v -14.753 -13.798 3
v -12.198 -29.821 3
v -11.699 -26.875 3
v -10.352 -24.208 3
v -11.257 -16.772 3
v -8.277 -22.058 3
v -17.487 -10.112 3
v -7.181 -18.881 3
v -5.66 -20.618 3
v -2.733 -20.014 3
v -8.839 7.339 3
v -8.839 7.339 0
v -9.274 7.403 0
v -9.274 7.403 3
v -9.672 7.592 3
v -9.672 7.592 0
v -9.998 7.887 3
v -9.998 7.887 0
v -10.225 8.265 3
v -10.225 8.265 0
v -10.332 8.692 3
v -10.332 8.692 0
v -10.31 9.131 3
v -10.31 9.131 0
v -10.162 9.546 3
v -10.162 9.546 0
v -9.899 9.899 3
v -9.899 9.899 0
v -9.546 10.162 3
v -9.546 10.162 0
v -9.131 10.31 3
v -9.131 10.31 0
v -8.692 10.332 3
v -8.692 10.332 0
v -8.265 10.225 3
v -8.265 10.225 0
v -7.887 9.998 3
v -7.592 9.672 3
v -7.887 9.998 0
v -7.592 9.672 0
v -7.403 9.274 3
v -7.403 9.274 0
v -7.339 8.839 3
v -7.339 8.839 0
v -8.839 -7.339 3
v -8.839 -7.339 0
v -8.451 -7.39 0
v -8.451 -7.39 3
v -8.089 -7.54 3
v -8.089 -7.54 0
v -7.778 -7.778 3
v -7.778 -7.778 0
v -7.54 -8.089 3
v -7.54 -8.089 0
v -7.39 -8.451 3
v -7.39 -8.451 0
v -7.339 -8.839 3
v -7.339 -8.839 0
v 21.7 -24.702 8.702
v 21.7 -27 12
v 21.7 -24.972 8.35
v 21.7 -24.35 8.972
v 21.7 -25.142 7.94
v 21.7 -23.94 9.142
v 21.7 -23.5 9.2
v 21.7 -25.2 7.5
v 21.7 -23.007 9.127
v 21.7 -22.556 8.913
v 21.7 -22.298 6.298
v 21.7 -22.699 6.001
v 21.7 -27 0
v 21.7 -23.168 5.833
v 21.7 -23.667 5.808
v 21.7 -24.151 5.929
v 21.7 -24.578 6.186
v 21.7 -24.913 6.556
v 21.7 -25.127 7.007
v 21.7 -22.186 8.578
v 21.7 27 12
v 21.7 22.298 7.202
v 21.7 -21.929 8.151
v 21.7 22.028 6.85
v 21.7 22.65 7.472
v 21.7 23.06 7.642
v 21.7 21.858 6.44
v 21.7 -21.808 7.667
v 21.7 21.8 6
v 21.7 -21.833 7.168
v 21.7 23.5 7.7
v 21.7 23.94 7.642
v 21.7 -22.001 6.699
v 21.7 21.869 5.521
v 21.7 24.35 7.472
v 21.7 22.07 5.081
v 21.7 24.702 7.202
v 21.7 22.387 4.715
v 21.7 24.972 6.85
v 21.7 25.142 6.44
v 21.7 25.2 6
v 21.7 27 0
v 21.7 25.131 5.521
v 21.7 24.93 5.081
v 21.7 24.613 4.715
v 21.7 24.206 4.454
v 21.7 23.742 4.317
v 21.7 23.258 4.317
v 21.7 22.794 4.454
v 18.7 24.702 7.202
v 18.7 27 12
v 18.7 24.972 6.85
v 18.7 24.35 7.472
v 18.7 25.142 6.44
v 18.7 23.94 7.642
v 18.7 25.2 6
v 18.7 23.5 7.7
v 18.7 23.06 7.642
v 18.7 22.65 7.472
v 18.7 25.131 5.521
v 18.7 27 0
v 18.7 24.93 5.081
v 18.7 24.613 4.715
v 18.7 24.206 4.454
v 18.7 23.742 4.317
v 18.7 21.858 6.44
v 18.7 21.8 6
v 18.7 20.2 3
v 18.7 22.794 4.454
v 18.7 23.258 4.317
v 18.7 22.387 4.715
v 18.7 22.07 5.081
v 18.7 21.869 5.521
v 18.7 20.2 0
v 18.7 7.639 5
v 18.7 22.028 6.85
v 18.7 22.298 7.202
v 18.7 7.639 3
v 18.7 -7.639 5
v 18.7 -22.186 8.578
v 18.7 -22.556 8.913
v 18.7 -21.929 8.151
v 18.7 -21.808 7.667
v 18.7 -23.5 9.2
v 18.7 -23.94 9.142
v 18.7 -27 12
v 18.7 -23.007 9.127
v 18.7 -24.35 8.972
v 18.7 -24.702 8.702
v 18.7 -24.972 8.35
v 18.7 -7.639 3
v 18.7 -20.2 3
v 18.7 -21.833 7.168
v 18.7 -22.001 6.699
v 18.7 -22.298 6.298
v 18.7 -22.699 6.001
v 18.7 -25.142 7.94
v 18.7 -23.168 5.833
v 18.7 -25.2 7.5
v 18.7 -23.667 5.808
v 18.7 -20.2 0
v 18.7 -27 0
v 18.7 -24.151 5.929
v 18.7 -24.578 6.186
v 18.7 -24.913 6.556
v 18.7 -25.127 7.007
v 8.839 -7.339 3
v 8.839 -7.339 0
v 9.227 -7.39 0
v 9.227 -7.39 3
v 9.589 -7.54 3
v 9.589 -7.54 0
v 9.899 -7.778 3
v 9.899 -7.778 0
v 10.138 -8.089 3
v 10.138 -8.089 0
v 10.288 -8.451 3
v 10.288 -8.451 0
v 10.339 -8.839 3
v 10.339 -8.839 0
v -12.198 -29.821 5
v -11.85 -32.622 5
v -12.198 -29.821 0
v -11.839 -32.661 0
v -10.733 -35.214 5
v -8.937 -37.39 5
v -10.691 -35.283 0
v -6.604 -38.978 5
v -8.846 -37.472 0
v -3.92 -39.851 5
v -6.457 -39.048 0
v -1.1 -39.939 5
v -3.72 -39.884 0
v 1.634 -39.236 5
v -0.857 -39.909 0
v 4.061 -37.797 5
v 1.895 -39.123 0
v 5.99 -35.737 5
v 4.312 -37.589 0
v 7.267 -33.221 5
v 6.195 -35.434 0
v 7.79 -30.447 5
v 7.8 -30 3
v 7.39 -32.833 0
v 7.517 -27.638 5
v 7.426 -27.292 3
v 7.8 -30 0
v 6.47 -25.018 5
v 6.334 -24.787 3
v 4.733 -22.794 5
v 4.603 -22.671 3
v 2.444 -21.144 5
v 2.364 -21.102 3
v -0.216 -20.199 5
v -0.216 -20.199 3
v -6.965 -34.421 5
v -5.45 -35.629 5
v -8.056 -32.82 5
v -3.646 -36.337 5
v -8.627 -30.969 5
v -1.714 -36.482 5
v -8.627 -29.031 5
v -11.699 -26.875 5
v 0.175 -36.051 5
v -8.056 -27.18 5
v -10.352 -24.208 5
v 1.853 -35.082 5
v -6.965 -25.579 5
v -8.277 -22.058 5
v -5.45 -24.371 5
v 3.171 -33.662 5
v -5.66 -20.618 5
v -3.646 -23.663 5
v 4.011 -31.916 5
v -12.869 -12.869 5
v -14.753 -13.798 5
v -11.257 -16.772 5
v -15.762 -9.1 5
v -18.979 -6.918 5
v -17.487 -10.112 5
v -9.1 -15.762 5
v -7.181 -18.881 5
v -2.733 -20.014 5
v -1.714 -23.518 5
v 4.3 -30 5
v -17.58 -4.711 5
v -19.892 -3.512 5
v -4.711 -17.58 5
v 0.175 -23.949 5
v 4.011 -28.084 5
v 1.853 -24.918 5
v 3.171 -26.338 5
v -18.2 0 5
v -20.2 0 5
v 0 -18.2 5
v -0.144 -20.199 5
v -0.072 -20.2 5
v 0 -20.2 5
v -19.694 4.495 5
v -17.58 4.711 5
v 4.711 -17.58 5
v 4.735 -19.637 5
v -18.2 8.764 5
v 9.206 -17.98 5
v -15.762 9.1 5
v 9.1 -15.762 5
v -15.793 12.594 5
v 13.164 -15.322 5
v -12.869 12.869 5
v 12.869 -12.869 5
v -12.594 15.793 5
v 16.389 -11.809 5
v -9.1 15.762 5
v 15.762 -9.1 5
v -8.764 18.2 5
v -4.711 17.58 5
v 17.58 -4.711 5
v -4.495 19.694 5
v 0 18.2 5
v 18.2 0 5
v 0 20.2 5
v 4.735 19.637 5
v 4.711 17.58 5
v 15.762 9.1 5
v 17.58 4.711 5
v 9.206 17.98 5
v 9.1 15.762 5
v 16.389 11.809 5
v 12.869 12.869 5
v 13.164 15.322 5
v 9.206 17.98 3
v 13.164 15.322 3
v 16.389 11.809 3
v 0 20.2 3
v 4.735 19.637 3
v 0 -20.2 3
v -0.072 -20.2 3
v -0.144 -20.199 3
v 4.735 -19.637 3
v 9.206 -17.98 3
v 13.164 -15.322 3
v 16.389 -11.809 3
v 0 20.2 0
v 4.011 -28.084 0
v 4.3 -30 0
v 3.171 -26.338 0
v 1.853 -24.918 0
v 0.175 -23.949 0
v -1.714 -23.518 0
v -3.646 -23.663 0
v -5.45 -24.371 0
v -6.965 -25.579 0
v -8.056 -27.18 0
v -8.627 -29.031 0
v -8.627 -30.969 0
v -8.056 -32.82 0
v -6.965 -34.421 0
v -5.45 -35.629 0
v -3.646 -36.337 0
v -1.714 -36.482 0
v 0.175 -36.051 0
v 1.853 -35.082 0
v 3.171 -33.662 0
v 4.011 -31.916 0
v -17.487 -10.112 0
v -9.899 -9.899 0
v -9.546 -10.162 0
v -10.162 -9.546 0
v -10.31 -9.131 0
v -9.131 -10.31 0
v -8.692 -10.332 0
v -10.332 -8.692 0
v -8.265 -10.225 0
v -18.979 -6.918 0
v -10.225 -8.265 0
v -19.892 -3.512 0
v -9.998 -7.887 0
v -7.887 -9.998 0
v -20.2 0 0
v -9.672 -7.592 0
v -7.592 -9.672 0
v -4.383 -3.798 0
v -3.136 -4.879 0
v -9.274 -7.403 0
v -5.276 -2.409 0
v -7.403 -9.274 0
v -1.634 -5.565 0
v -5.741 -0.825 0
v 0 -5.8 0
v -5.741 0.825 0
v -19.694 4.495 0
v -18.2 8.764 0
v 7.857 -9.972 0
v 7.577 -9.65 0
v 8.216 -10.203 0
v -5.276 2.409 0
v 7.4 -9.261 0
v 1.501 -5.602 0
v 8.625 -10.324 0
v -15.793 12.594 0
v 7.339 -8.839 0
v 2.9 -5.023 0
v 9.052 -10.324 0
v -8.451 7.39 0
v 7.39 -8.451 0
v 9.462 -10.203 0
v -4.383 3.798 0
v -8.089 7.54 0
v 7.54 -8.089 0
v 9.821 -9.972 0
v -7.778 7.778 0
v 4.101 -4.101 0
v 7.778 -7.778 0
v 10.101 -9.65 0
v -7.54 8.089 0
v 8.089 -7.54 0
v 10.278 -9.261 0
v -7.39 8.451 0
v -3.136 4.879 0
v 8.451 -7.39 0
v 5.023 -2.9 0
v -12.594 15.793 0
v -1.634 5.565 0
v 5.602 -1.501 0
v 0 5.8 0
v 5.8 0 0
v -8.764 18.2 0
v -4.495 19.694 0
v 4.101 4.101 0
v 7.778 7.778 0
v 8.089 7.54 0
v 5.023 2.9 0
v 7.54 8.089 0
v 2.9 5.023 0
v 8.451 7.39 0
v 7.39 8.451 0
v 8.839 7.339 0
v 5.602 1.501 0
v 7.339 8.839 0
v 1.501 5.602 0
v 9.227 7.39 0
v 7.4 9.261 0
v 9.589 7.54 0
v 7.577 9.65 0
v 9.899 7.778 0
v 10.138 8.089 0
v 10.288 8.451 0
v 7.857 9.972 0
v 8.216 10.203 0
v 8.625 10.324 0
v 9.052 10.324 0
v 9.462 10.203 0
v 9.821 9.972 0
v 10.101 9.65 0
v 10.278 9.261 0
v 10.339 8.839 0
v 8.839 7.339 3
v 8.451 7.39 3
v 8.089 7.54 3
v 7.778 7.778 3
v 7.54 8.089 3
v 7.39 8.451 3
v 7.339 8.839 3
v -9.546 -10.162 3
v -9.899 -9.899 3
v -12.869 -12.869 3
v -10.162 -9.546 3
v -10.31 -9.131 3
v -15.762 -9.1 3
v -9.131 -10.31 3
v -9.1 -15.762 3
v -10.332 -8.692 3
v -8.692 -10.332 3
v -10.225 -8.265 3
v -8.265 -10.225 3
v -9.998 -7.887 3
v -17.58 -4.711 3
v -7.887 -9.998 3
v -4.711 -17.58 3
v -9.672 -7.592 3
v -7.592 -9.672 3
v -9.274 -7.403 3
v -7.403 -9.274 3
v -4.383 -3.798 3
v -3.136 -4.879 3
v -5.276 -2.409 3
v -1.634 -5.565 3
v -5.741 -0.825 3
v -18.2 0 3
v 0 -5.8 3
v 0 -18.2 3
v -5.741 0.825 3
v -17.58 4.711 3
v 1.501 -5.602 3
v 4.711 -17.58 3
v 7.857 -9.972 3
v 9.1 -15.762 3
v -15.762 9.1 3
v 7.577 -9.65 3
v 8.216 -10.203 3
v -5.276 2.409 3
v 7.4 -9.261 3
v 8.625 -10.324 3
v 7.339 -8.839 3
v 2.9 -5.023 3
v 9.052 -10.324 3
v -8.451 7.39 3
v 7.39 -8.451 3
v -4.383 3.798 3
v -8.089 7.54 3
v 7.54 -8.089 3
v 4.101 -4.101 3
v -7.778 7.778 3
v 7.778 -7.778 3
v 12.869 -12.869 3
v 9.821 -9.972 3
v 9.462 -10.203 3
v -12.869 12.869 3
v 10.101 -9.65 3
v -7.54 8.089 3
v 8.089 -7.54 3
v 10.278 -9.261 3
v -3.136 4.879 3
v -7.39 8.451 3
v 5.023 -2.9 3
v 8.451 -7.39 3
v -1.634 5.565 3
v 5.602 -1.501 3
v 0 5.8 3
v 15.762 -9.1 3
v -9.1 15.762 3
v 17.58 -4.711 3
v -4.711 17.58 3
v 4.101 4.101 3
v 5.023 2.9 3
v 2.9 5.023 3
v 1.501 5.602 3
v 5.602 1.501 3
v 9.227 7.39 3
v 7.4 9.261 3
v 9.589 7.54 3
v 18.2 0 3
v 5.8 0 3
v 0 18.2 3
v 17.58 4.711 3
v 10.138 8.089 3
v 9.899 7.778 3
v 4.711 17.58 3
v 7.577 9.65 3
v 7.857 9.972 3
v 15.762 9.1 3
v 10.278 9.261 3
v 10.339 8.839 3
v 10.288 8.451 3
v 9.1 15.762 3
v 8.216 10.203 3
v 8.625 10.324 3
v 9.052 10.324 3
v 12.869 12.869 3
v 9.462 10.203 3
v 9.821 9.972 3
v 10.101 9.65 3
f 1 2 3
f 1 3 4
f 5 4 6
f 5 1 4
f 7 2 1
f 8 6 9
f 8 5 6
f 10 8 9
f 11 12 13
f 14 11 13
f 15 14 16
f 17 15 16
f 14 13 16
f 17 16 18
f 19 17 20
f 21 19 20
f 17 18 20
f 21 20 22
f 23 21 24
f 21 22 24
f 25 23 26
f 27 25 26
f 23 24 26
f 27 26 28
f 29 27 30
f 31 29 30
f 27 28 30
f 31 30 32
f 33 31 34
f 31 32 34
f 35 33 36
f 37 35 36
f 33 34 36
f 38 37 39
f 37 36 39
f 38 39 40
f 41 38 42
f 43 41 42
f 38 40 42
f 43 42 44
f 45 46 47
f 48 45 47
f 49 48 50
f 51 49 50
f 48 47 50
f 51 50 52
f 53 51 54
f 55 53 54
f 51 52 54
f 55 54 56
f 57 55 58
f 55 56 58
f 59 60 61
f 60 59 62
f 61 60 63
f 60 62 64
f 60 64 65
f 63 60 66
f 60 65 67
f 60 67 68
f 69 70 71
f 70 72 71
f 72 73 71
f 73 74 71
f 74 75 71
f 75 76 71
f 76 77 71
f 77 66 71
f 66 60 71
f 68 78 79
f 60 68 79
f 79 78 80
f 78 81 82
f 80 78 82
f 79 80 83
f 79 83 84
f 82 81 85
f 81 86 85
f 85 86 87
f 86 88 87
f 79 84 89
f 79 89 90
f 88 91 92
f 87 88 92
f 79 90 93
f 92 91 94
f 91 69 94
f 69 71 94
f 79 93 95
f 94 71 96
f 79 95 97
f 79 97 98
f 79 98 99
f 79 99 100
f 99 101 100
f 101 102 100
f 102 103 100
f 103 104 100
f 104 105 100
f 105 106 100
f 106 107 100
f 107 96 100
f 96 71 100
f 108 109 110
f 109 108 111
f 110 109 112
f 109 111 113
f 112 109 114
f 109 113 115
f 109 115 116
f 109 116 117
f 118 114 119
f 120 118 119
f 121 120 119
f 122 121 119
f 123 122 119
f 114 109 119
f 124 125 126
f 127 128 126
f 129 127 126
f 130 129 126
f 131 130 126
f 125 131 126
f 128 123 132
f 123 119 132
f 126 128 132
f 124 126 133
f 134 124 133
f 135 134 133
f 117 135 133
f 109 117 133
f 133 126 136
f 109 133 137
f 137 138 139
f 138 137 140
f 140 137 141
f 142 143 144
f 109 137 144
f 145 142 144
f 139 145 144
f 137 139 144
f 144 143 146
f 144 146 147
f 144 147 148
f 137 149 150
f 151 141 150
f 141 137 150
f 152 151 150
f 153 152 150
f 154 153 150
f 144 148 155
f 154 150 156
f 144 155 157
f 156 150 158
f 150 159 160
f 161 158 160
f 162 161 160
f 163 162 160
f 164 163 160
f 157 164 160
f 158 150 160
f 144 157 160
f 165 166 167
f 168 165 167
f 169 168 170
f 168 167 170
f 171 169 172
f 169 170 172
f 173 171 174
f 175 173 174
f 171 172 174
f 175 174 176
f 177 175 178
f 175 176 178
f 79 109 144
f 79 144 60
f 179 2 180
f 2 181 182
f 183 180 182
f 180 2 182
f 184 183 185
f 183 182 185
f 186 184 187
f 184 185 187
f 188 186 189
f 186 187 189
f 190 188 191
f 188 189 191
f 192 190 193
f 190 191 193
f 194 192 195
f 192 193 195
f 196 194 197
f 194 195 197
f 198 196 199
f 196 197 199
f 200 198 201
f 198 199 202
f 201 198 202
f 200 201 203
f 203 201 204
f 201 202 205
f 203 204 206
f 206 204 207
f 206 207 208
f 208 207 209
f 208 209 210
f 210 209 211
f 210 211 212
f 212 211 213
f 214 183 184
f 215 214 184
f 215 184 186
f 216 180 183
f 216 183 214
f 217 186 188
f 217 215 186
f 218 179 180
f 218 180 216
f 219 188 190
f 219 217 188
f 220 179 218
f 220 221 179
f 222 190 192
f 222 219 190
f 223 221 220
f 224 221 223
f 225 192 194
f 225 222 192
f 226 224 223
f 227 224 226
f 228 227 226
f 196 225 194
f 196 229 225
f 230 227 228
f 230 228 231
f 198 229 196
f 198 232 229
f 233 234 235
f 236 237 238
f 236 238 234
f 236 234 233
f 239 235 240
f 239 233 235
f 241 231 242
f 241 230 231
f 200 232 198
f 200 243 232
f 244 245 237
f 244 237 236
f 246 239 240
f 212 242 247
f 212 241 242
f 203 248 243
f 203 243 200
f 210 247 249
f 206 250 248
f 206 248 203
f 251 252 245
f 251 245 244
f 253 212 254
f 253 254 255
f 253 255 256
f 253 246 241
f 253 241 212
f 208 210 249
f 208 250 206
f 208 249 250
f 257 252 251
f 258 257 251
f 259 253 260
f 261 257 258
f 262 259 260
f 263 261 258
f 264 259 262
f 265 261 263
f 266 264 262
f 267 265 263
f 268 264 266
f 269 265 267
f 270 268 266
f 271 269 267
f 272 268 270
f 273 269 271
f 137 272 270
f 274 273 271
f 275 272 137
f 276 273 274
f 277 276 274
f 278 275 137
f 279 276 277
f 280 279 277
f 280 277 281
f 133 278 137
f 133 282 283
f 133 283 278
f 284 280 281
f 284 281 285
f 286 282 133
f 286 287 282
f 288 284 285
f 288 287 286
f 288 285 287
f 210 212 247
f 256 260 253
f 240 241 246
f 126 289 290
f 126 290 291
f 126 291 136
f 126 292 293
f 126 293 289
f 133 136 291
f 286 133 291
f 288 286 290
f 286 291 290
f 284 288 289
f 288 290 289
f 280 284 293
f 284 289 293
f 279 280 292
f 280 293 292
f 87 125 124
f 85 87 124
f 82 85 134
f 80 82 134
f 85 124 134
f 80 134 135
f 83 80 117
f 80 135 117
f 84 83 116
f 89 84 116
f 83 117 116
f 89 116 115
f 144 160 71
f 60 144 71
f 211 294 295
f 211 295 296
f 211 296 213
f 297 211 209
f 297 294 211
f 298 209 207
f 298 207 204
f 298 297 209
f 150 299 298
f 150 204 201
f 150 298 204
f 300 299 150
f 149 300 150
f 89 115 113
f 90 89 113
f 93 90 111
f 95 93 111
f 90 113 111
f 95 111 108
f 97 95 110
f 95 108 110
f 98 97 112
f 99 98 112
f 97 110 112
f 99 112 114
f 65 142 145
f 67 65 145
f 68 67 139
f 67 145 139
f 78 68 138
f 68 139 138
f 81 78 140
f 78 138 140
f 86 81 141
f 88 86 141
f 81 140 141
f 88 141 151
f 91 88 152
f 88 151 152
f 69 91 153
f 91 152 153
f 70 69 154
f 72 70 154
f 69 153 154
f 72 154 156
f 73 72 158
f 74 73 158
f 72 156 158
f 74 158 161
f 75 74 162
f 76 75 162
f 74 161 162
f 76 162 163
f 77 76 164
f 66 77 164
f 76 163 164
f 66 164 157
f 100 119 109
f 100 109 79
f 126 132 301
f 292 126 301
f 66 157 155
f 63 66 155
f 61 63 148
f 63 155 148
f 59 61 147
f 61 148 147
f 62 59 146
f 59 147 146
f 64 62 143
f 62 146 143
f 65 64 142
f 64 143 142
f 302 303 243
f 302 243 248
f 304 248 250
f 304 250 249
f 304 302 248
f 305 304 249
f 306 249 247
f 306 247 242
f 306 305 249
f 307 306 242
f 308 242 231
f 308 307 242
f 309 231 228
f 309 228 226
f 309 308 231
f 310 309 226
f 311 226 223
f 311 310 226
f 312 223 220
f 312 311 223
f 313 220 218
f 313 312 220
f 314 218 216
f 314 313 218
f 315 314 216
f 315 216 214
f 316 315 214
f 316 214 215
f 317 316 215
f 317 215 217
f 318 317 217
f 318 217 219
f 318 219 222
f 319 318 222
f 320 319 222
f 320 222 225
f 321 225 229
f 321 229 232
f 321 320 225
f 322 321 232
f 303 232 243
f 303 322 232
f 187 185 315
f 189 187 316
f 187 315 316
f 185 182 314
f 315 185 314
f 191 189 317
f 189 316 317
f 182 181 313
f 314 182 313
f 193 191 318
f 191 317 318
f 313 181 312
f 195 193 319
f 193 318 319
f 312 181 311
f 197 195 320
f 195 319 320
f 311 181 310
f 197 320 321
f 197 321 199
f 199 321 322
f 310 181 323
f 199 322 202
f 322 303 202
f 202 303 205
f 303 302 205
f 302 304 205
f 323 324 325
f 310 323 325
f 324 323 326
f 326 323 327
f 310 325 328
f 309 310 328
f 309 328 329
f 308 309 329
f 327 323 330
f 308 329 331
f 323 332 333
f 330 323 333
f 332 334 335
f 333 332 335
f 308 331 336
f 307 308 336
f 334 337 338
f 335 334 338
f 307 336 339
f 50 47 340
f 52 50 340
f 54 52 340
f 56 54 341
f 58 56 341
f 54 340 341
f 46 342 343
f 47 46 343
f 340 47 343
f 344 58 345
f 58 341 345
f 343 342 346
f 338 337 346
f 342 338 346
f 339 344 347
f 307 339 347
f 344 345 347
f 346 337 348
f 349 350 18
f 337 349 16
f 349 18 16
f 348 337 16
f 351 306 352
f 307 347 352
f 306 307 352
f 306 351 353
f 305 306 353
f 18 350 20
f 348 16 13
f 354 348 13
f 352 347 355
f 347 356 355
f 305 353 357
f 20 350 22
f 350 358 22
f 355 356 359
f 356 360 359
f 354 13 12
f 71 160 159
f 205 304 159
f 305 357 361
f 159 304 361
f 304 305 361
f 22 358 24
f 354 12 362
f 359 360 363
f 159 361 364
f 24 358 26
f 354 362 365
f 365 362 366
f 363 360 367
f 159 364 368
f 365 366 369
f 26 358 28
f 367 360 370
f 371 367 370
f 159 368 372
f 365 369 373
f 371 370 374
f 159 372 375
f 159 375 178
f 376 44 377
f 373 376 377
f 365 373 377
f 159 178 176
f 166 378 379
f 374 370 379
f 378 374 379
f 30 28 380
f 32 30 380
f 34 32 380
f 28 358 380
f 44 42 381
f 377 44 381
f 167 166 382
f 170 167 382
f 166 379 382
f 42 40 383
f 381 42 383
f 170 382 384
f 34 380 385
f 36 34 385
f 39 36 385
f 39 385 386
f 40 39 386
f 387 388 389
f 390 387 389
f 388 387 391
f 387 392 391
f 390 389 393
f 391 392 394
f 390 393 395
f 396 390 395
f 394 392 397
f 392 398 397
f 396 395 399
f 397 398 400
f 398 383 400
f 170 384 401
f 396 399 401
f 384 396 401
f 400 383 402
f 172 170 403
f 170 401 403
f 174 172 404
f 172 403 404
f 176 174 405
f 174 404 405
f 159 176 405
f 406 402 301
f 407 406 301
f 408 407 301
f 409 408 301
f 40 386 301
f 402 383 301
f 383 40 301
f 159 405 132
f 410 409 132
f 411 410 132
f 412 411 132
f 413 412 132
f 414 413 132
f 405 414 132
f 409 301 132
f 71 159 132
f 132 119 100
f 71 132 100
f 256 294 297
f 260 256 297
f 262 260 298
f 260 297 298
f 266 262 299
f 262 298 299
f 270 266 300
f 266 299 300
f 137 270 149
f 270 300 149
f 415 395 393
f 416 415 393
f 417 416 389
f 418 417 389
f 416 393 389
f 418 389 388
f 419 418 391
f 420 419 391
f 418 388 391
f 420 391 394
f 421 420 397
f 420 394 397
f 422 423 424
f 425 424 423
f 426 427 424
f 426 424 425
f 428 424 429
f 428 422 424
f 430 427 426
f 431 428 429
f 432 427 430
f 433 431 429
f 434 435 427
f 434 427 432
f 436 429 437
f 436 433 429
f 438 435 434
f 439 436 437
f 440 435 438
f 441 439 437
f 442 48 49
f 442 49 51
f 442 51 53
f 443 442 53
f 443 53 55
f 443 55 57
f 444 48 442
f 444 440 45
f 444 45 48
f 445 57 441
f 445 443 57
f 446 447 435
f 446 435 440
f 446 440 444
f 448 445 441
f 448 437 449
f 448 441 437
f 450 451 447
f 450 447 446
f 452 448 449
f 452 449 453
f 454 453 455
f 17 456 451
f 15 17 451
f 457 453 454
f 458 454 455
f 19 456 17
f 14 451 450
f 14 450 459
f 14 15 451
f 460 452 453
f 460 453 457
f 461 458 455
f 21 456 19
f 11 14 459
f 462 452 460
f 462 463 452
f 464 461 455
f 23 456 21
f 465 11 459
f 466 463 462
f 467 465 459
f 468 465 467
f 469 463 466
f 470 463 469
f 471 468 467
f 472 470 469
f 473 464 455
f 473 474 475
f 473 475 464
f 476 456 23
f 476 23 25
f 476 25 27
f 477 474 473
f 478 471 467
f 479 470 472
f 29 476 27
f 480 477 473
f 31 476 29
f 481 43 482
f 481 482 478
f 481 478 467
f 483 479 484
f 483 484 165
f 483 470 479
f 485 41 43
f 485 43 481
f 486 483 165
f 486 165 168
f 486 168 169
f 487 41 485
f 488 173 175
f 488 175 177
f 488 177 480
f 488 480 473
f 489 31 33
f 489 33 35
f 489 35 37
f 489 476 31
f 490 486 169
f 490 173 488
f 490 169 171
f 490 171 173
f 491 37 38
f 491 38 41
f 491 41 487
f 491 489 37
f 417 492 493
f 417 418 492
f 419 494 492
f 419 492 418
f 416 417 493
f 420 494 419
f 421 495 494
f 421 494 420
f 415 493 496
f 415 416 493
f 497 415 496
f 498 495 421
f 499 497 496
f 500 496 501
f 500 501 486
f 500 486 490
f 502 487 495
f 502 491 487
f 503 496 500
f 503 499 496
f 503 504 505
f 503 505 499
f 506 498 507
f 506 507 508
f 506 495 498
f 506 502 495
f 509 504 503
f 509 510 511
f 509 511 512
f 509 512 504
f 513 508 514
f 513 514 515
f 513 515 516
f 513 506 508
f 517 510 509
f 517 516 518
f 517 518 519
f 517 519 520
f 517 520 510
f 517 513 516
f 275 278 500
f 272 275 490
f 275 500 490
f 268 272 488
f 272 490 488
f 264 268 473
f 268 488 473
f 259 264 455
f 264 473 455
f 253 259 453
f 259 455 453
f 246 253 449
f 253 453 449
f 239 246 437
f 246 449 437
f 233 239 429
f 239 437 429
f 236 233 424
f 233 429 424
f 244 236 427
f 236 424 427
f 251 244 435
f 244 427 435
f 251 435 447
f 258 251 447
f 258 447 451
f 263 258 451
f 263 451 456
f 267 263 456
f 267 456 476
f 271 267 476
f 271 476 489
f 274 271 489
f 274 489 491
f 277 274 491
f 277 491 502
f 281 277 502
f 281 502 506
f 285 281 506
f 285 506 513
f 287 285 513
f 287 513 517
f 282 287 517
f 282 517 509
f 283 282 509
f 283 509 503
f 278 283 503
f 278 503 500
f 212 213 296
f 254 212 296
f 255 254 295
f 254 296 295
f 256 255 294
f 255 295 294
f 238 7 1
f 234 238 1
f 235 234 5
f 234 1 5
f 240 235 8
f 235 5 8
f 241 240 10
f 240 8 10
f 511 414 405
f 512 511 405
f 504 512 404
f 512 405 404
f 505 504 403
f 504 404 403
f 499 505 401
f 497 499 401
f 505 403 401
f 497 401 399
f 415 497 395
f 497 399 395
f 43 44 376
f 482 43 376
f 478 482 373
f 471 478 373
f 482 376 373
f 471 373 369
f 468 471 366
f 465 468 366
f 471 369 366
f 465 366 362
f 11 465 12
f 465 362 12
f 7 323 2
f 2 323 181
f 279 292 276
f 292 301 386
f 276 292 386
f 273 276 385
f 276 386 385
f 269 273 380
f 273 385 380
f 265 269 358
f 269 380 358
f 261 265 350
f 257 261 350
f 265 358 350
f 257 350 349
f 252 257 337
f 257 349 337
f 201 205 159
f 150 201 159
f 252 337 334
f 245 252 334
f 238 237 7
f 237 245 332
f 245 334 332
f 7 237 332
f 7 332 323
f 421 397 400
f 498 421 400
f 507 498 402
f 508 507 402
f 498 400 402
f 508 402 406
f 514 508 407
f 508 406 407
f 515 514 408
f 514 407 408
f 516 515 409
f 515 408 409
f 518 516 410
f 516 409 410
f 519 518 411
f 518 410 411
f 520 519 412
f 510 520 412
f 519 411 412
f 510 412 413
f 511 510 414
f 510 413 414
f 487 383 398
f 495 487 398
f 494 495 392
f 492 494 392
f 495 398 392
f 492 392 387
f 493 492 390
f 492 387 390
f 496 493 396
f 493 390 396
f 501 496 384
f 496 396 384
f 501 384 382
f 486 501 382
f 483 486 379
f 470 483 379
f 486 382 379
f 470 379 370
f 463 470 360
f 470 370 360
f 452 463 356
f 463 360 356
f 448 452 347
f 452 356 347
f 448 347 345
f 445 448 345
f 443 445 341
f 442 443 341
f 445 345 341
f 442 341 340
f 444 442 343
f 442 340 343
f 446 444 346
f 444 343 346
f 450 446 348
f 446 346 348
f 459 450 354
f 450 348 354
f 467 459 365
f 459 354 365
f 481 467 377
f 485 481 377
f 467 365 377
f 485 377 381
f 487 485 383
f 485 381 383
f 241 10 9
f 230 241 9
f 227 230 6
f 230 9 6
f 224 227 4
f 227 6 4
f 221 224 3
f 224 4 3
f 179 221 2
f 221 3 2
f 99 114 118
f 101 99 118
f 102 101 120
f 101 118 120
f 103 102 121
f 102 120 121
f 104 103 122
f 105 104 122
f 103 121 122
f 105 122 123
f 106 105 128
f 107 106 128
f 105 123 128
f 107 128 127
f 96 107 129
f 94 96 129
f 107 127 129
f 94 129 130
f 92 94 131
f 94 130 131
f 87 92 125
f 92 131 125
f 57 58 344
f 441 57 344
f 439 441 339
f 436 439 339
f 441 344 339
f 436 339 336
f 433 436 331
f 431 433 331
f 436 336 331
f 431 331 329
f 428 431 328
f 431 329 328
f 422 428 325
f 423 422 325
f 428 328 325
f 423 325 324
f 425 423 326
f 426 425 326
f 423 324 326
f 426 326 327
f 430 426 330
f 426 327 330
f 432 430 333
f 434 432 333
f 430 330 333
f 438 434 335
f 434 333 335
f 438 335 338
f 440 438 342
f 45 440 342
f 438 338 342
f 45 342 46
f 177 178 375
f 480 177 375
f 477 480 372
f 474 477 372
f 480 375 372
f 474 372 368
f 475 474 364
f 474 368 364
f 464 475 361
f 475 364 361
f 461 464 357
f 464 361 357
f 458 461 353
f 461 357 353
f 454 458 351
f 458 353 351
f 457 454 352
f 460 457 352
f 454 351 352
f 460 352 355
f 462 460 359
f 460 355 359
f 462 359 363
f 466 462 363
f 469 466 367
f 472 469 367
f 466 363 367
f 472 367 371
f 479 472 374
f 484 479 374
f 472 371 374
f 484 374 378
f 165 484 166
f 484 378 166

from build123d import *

# Parameters (mm, degrees)
F0_W     = 3
F0_H     = 6.8
F1_DEPTH = 12
F2_DEPTH = 5
F3_DEPTH = 3
F0_R     = 6.5
F4_DEPTH = 5
F5_DEPTH = 3
F7_DEPTH = 25
F8_DEPTH = 25
F9_DEPTH = 3


with BuildPart() as f1:
    # F0 (on Top) → F1 (new body)
    with BuildSketch(Plane.XY):
        with Locations((20.2, 23.6)):
            Rectangle(F0_W, F0_H)
        with BuildLine():
            Line((18.7, 20.2), (18.7, 7.6387171698))
            ThreePointArc((18.7, 7.6387171698), (19.8214530244, 3.8923000912), (20.2, 0))
            Line((20.2, 0), (21.7, 0))
            Line((21.7, 0), (21.7, 20.2))
            Line((21.7, 20.2), (18.7, 20.2))
        make_face()
        with BuildLine():
            Line((21.7, 0), (20.2, 0))
            ThreePointArc((20.2, 0), (19.8214530244, -3.8923000912), (18.7, -7.6387171698))
            Line((18.7, -7.6387171698), (18.7, -20.2))
            Line((18.7, -20.2), (21.7, -20.2))
            Line((21.7, -20.2), (21.7, 0))
        make_face()
        with Locations((20.2, -23.6)):
            Rectangle(F0_W, F0_H)
        with BuildLine():
            ThreePointArc((20.2, 0), (19.8214530244, 3.8923000912), (18.7, 7.6387171698))
            Line((18.7, 7.6387171698), (18.7, 0))
            Line((18.7, 0), (20.2, 0))
        make_face()
        with BuildLine():
            ThreePointArc((18.7, -7.6387171698), (19.8214530244, -3.8923000912), (20.2, 0))
            Line((20.2, 0), (18.7, 0))
            Line((18.7, 0), (18.7, -7.6387171698))
        make_face()
    extrude(amount=F1_DEPTH)

    # F0 (on Top) → F2 (join)
    with BuildSketch(Plane.XY):
        with BuildLine():
            Line((0, 18.2), (0, 20.2))
            ThreePointArc((0, 20.2), (-14.28355698, 14.28355698), (-20.2, 0))
            Line((-20.2, 0), (-17.4867563263, -10.1120400111))
            ThreePointArc((-17.4867563263, -10.1120400111), (-11.2572434768, -16.7724318244), (-2.7332534209, -20.0142280825))
            ThreePointArc((-2.7332534209, -20.0142280825), (-1.4686306009, -20.0267809208), (-0.215705511, -20.1988482625))
            ThreePointArc((-0.215705511, -20.1988482625), (-0.1078542929, -20.1997120636), (0, -20.2))
            Line((0, -20.2), (0, -18.2))
            ThreePointArc((0, -18.2), (-18.2, 0), (0, 18.2))
        make_face()
        with BuildLine():
            ThreePointArc((18.7, 7.6387171698), (11.2636120576, 16.7681556355), (0, 20.2))
            Line((0, 20.2), (0, 18.2))
            ThreePointArc((0, 18.2), (12.8693434176, 12.8693434176), (18.2, 0))
            ThreePointArc((18.2, 0), (12.8693434176, -12.8693434176), (0, -18.2))
            Line((0, -18.2), (0, -20.2))
            ThreePointArc((0, -20.2), (11.2636120576, -16.7681556355), (18.7, -7.6387171698))
            Line((18.7, -7.6387171698), (18.7, 0))
            Line((18.7, 0), (18.7, 7.6387171698))
        make_face()
        with BuildLine():
            Line((-17.4867563263, -10.1120400111), (-20.2, 0))
            ThreePointArc((-20.2, 0), (-19.5099010478, -5.23486018), (-17.4867563263, -10.1120400111))
        make_face()
    extrude(amount=F2_DEPTH)

    # F0 (on Top) → F3 (join)
    with BuildSketch(Plane.XY):
        with BuildLine():
            Line((0, 8.8388347648), (0, 18.2))
            ThreePointArc((0, 18.2), (-18.2, 0), (0, -18.2))
            Line((0, -18.2), (0, -8.8388347648))
            Line((0, -8.8388347648), (-7.3388347648, -8.8388347648))
            ThreePointArc((-7.3388347648, -8.8388347648), (-9.8994949366, -9.8994949366), (-8.8388347648, -7.3388347648))
            Line((-8.8388347648, -7.3388347648), (-8.8388347648, 7.3388347648))
            ThreePointArc((-8.8388347648, 7.3388347648), (-9.8994949366, 9.8994949366), (-7.3388347648, 8.8388347648))
            Line((-7.3388347648, 8.8388347648), (0, 8.8388347648))
        make_face()
        with BuildLine():
            Line((7.3388347648, 8.8388347648), (0, 8.8388347648))
            Line((0, 8.8388347648), (0, 5.8))
            ThreePointArc((0, 5.8), (4.1012193309, 4.1012193309), (5.8, 0))
            ThreePointArc((5.8, 0), (4.1012193309, -4.1012193309), (0, -5.8))
            Line((0, -5.8), (0, -8.8388347648))
            Line((0, -8.8388347648), (7.3388347648, -8.8388347648))
            ThreePointArc((7.3388347648, -8.8388347648), (7.7781745931, -7.7781745931), (8.8388347648, -7.3388347648))
            Line((8.8388347648, -7.3388347648), (8.8388347648, 7.3388347648))
            ThreePointArc((8.8388347648, 7.3388347648), (7.7781745931, 7.7781745931), (7.3388347648, 8.8388347648))
        make_face()
        with BuildLine():
            Line((0, 5.8), (0, 8.8388347648))
            Line((0, 8.8388347648), (-7.3388347648, 8.8388347648))
            ThreePointArc((-7.3388347648, 8.8388347648), (-7.7781745931, 7.7781745931), (-8.8388347648, 7.3388347648))
            Line((-8.8388347648, 7.3388347648), (-8.8388347648, -7.3388347648))
            ThreePointArc((-8.8388347648, -7.3388347648), (-7.7781745931, -7.7781745931), (-7.3388347648, -8.8388347648))
            Line((-7.3388347648, -8.8388347648), (0, -8.8388347648))
            Line((0, -8.8388347648), (0, -5.8))
            ThreePointArc((0, -5.8), (-5.8, 0), (0, 5.8))
        make_face()
        with BuildLine():
            ThreePointArc((18.2, 0), (12.8693434176, 12.8693434176), (0, 18.2))
            Line((0, 18.2), (0, 8.8388347648))
            Line((0, 8.8388347648), (7.3388347648, 8.8388347648))
            ThreePointArc((7.3388347648, 8.8388347648), (8.8388347648, 10.3388347648), (10.3388347648, 8.8388347648))
            ThreePointArc((10.3388347648, 8.8388347648), (9.8994949366, 7.7781745931), (8.8388347648, 7.3388347648))
            Line((8.8388347648, 7.3388347648), (8.8388347648, -7.3388347648))
            ThreePointArc((8.8388347648, -7.3388347648), (9.8994949366, -7.7781745931), (10.3388347648, -8.8388347648))
            ThreePointArc((10.3388347648, -8.8388347648), (8.8388347648, -10.3388347648), (7.3388347648, -8.8388347648))
            Line((7.3388347648, -8.8388347648), (0, -8.8388347648))
            Line((0, -8.8388347648), (0, -18.2))
            ThreePointArc((0, -18.2), (12.8693434176, -12.8693434176), (18.2, 0))
        make_face()
    extrude(amount=F3_DEPTH)

    # F0 (on Top) → F4 (join)
    with BuildSketch(Plane.XY):
        with BuildLine():
            ThreePointArc((-0.215705511, -20.1988482625), (-1.4686306009, -20.0267809208), (-2.7332534209, -20.0142280825))
            ThreePointArc((-2.7332534209, -20.0142280825), (-1.4773661863, -20.14590254), (-0.215705511, -20.1988482625))
        make_face()
        with BuildLine():
            ThreePointArc((-0.215705511, -20.1988482625), (-1.4773661863, -20.14590254), (-2.7332534209, -20.0142280825))
            ThreePointArc((-2.7332534209, -20.0142280825), (-9.3953899149, -23.0554795722), (-12.1984032717, -29.8213046815))
            ThreePointArc((-12.1984032717, -29.8213046815), (-2.2893512261, -39.99960081), (7.8, -30))
            ThreePointArc((7.8, -30), (5.5408961009, -23.6692395753), (-0.215705511, -20.1988482625))
        make_face()
        with Locations((-2.2, -30)):
            Circle(F0_R, mode=Mode.SUBTRACT)
    extrude(amount=F4_DEPTH)

    # F0 (on Top) → F5 (join)
    with BuildSketch(Plane.XY):
        with BuildLine():
            ThreePointArc((-2.7332534209, -20.0142280825), (-11.2572434768, -16.7724318244), (-17.4867563263, -10.1120400111))
            Line((-17.4867563263, -10.1120400111), (-12.1984032717, -29.8213046815))
            ThreePointArc((-12.1984032717, -29.8213046815), (-9.3953899149, -23.0554795722), (-2.7332534209, -20.0142280825))
        make_face()
        with BuildLine():
            Line((18.7, -20.2), (18.7, -7.6387171698))
            ThreePointArc((18.7, -7.6387171698), (11.2636120576, -16.7681556355), (0, -20.2))
            Line((0, -20.2), (18.7, -20.2))
        make_face()
        with BuildLine():
            Line((18.7, -20.2), (0, -20.2))
            ThreePointArc((0, -20.2), (-0.1078542929, -20.1997120636), (-0.215705511, -20.1988482625))
            ThreePointArc((-0.215705511, -20.1988482625), (5.5408961009, -23.6692395753), (7.8, -30))
            Line((7.8, -30), (18.7, -20.2))
        make_face()
    extrude(amount=F5_DEPTH)

    # F6 (on face) → F7 (cut)
    with BuildSketch(Plane(origin=(18.7, 0, 0), x_dir=(0, -1, 0), z_dir=(-1, 0, 0))):
        with BuildLine():
            Line((-25.2, 6), (-23.5, 6))
            Line((-23.5, 6), (-23.5, 7.7))
            ThreePointArc((-23.5, 7.7), (-24.702081528, 7.202081528), (-25.2, 6))
        make_face()
        with BuildLine():
            Line((-21.8, 6), (-23.5, 6))
            Line((-23.5, 6), (-25.2, 6))
            ThreePointArc((-25.2, 6), (-23.5, 4.3), (-21.8, 6))
        make_face()
        with BuildLine():
            Line((-23.5, 7.7), (-23.5, 6))
            Line((-23.5, 6), (-21.8, 6))
            ThreePointArc((-21.8, 6), (-22.297918472, 7.202081528), (-23.5, 7.7))
        make_face()
    extrude(amount=-F7_DEPTH, mode=Mode.SUBTRACT)

    # F6 (on face) → F8 (cut)
    with BuildSketch(Plane(origin=(18.7, 0, 0), x_dir=(0, -1, 0), z_dir=(-1, 0, 0))):
        with BuildLine():
            Line((-21.8, 6), (-23.5, 6))
            Line((-23.5, 6), (-25.2, 6))
            ThreePointArc((-25.2, 6), (-23.5, 4.3), (-21.8, 6))
        make_face()
        with BuildLine():
            Line((-25.2, 6), (-23.5, 6))
            Line((-23.5, 6), (-23.5, 7.7))
            ThreePointArc((-23.5, 7.7), (-24.702081528, 7.202081528), (-25.2, 6))
        make_face()
        with BuildLine():
            Line((-23.5, 7.7), (-23.5, 6))
            Line((-23.5, 6), (-21.8, 6))
            ThreePointArc((-21.8, 6), (-22.297918472, 7.202081528), (-23.5, 7.7))
        make_face()
        with BuildLine():
            ThreePointArc((23.5, 9.2), (22.297918472, 6.297918472), (25.2, 7.5))
            ThreePointArc((25.2, 7.5), (24.702081528, 8.702081528), (23.5, 9.2))
        make_face()
    extrude(amount=-F8_DEPTH, mode=Mode.SUBTRACT)

    # F0 (on Top) → F9 (join)
    with BuildSketch(Plane.XY):
        with BuildLine():
            Line((18.7, 20.2), (0, 20.2))
            ThreePointArc((0, 20.2), (11.2636120576, 16.7681556355), (18.7, 7.6387171698))
            Line((18.7, 7.6387171698), (18.7, 20.2))
        make_face()
    extrude(amount=F9_DEPTH)


with BuildPart() as f10_1:
    # F10: copy of F1
    add(f1.part)


solid = f10_1.part
